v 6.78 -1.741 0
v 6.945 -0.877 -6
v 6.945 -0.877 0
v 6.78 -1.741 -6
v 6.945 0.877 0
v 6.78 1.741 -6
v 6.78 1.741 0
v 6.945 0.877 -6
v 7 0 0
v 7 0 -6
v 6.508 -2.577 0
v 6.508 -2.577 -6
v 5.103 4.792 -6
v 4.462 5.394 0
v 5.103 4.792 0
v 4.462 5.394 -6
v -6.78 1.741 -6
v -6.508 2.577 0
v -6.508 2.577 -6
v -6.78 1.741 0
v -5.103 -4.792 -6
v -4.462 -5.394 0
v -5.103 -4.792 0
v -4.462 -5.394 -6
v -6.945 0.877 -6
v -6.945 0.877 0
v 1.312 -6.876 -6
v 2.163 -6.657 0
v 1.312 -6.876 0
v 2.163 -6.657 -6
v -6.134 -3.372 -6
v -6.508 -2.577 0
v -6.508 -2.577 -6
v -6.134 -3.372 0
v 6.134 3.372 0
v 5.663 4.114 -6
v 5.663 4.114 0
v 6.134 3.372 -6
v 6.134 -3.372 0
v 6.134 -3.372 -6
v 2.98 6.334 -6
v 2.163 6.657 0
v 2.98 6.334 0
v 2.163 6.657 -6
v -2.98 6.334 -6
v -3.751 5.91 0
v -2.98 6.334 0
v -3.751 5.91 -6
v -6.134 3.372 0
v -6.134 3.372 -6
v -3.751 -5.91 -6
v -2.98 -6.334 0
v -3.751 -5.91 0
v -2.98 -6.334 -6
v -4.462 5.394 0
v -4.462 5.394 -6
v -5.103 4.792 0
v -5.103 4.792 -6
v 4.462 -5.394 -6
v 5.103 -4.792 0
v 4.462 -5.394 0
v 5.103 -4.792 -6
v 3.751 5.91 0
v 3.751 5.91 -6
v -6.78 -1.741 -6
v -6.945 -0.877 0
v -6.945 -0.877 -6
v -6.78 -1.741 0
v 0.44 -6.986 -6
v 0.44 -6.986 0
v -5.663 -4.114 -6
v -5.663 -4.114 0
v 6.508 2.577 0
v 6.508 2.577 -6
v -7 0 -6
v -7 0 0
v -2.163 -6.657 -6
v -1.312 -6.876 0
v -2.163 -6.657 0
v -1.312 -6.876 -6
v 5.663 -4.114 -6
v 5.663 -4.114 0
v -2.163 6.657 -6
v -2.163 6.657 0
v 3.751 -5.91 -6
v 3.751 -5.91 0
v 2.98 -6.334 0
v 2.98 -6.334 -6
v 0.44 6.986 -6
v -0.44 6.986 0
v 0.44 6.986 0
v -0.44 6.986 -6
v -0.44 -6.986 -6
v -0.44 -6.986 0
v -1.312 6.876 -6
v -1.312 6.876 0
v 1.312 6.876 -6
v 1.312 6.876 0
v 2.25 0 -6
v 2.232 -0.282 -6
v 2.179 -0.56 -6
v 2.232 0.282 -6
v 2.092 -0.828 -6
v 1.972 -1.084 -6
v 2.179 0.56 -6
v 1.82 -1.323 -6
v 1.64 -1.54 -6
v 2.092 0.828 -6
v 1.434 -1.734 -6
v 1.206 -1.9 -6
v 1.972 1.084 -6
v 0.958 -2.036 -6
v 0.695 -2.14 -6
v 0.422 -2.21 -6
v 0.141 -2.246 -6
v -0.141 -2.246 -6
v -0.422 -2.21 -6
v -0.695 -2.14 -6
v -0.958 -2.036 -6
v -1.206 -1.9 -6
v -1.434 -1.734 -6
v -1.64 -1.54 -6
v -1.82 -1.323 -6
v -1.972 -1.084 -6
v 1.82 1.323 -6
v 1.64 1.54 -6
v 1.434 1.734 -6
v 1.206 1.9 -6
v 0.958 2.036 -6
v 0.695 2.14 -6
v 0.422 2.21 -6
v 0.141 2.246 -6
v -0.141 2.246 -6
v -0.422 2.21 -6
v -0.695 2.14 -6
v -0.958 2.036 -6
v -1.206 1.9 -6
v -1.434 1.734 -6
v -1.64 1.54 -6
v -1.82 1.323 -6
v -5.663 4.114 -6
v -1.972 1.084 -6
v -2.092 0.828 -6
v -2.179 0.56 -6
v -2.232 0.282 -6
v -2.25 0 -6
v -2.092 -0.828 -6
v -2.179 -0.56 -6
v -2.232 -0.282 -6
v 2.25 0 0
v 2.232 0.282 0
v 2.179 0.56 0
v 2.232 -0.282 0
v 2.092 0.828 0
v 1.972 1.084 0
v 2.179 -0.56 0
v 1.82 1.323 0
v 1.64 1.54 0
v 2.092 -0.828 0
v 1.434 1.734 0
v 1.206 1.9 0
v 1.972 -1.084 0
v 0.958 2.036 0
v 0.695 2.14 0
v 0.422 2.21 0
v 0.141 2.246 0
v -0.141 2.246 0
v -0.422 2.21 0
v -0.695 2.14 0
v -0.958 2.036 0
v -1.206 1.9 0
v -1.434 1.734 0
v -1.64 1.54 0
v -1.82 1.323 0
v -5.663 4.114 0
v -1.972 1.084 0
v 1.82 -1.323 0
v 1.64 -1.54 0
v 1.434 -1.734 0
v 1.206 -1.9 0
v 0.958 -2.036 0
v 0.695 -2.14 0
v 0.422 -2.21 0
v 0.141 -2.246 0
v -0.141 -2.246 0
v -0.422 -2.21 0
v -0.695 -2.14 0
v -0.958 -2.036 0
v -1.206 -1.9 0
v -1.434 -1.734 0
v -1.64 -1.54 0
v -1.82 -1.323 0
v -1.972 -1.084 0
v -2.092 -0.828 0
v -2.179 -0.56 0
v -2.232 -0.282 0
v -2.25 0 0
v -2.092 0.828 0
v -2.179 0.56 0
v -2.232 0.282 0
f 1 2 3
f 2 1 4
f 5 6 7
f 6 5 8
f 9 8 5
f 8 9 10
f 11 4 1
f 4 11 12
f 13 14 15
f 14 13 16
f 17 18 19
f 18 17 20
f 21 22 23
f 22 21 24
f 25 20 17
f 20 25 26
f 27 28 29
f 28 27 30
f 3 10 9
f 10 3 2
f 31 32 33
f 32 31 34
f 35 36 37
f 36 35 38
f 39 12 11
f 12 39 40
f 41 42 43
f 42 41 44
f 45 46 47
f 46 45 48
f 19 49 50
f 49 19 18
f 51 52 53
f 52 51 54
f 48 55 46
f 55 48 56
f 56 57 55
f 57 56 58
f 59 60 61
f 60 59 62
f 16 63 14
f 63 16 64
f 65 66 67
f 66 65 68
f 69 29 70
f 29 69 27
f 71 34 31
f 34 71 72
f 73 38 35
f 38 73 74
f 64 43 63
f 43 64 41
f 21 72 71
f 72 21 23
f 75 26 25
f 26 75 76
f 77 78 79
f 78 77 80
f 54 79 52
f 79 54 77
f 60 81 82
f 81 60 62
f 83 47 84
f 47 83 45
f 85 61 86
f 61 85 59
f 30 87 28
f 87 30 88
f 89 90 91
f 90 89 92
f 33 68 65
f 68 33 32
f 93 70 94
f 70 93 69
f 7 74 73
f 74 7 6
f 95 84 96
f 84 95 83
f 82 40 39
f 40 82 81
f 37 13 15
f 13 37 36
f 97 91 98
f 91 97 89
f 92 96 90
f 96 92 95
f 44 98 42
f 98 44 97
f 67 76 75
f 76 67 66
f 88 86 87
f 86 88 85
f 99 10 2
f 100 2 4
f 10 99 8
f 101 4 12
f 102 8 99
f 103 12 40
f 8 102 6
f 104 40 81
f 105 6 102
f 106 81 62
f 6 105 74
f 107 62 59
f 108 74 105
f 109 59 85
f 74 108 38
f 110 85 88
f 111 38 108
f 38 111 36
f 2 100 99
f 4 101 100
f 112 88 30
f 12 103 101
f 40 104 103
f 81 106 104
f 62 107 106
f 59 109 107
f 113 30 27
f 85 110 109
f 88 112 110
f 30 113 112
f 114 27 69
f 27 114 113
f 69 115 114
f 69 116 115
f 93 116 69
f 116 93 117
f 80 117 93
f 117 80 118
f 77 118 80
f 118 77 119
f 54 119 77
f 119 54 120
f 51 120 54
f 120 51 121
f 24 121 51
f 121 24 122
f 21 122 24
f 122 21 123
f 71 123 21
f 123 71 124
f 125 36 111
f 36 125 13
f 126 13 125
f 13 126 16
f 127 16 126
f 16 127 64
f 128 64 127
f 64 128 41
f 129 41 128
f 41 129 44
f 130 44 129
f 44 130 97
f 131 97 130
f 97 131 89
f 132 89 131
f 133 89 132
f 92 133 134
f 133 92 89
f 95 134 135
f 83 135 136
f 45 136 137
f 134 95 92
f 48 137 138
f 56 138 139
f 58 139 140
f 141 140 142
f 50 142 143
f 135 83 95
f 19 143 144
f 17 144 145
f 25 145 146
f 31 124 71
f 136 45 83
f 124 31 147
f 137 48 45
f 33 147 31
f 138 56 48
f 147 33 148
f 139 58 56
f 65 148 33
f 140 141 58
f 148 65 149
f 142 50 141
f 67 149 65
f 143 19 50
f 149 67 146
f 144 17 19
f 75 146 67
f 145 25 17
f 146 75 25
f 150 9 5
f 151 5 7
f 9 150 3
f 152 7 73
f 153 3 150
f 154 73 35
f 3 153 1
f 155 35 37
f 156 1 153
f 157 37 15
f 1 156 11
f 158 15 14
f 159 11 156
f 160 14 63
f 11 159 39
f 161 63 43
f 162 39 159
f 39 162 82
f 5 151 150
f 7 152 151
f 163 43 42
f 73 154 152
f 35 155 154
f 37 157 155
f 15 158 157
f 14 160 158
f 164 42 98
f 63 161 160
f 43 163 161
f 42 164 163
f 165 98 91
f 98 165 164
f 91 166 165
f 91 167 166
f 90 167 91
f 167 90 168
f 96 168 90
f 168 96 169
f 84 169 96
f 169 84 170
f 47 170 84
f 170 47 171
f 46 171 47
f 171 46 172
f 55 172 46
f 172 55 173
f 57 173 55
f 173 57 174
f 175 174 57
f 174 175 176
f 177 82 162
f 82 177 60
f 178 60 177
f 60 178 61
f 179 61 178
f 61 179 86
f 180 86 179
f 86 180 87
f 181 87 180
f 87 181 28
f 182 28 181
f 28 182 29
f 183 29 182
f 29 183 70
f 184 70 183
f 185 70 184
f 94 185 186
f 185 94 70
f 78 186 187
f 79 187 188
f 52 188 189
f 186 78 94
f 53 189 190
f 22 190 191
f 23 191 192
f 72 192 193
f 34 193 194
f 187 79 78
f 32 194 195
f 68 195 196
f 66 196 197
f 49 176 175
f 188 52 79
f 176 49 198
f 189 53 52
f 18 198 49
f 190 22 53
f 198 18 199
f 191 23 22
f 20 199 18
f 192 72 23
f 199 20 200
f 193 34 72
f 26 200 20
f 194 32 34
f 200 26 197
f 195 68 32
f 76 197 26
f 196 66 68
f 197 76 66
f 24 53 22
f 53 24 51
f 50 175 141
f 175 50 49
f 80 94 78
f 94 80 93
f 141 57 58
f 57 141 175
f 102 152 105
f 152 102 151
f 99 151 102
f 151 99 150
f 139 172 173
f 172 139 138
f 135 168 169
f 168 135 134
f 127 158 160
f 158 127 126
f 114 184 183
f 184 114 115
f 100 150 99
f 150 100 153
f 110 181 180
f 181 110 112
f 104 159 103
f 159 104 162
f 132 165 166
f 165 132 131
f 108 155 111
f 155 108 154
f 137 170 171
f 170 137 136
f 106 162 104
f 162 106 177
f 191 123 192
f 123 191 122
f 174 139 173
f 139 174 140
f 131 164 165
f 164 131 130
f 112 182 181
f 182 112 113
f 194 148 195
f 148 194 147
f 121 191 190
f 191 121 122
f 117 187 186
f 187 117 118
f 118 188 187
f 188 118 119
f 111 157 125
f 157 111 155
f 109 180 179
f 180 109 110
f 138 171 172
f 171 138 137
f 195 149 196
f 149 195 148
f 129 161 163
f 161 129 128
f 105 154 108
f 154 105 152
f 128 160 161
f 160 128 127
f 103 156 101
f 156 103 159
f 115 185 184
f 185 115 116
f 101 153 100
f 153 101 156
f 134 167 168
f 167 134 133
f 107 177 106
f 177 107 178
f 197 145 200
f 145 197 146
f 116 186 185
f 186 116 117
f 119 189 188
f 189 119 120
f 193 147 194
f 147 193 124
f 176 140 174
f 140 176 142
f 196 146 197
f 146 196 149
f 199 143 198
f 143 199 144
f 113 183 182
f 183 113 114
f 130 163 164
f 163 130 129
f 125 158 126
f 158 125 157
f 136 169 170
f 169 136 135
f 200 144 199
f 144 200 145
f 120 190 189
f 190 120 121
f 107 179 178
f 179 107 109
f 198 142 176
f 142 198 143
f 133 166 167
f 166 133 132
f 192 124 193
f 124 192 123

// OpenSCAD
$fn = 50;


difference() {
	union() {
		translate(v = [0, 0, -6.0000000000]) {
			cylinder(h = 6, r = 7.0000000000);
		}
	}
	union() {
		#translate(v = [0, 0, -6]) {
			cylinder(h = 6, r = 2.2500000000);
		}
	}
}
